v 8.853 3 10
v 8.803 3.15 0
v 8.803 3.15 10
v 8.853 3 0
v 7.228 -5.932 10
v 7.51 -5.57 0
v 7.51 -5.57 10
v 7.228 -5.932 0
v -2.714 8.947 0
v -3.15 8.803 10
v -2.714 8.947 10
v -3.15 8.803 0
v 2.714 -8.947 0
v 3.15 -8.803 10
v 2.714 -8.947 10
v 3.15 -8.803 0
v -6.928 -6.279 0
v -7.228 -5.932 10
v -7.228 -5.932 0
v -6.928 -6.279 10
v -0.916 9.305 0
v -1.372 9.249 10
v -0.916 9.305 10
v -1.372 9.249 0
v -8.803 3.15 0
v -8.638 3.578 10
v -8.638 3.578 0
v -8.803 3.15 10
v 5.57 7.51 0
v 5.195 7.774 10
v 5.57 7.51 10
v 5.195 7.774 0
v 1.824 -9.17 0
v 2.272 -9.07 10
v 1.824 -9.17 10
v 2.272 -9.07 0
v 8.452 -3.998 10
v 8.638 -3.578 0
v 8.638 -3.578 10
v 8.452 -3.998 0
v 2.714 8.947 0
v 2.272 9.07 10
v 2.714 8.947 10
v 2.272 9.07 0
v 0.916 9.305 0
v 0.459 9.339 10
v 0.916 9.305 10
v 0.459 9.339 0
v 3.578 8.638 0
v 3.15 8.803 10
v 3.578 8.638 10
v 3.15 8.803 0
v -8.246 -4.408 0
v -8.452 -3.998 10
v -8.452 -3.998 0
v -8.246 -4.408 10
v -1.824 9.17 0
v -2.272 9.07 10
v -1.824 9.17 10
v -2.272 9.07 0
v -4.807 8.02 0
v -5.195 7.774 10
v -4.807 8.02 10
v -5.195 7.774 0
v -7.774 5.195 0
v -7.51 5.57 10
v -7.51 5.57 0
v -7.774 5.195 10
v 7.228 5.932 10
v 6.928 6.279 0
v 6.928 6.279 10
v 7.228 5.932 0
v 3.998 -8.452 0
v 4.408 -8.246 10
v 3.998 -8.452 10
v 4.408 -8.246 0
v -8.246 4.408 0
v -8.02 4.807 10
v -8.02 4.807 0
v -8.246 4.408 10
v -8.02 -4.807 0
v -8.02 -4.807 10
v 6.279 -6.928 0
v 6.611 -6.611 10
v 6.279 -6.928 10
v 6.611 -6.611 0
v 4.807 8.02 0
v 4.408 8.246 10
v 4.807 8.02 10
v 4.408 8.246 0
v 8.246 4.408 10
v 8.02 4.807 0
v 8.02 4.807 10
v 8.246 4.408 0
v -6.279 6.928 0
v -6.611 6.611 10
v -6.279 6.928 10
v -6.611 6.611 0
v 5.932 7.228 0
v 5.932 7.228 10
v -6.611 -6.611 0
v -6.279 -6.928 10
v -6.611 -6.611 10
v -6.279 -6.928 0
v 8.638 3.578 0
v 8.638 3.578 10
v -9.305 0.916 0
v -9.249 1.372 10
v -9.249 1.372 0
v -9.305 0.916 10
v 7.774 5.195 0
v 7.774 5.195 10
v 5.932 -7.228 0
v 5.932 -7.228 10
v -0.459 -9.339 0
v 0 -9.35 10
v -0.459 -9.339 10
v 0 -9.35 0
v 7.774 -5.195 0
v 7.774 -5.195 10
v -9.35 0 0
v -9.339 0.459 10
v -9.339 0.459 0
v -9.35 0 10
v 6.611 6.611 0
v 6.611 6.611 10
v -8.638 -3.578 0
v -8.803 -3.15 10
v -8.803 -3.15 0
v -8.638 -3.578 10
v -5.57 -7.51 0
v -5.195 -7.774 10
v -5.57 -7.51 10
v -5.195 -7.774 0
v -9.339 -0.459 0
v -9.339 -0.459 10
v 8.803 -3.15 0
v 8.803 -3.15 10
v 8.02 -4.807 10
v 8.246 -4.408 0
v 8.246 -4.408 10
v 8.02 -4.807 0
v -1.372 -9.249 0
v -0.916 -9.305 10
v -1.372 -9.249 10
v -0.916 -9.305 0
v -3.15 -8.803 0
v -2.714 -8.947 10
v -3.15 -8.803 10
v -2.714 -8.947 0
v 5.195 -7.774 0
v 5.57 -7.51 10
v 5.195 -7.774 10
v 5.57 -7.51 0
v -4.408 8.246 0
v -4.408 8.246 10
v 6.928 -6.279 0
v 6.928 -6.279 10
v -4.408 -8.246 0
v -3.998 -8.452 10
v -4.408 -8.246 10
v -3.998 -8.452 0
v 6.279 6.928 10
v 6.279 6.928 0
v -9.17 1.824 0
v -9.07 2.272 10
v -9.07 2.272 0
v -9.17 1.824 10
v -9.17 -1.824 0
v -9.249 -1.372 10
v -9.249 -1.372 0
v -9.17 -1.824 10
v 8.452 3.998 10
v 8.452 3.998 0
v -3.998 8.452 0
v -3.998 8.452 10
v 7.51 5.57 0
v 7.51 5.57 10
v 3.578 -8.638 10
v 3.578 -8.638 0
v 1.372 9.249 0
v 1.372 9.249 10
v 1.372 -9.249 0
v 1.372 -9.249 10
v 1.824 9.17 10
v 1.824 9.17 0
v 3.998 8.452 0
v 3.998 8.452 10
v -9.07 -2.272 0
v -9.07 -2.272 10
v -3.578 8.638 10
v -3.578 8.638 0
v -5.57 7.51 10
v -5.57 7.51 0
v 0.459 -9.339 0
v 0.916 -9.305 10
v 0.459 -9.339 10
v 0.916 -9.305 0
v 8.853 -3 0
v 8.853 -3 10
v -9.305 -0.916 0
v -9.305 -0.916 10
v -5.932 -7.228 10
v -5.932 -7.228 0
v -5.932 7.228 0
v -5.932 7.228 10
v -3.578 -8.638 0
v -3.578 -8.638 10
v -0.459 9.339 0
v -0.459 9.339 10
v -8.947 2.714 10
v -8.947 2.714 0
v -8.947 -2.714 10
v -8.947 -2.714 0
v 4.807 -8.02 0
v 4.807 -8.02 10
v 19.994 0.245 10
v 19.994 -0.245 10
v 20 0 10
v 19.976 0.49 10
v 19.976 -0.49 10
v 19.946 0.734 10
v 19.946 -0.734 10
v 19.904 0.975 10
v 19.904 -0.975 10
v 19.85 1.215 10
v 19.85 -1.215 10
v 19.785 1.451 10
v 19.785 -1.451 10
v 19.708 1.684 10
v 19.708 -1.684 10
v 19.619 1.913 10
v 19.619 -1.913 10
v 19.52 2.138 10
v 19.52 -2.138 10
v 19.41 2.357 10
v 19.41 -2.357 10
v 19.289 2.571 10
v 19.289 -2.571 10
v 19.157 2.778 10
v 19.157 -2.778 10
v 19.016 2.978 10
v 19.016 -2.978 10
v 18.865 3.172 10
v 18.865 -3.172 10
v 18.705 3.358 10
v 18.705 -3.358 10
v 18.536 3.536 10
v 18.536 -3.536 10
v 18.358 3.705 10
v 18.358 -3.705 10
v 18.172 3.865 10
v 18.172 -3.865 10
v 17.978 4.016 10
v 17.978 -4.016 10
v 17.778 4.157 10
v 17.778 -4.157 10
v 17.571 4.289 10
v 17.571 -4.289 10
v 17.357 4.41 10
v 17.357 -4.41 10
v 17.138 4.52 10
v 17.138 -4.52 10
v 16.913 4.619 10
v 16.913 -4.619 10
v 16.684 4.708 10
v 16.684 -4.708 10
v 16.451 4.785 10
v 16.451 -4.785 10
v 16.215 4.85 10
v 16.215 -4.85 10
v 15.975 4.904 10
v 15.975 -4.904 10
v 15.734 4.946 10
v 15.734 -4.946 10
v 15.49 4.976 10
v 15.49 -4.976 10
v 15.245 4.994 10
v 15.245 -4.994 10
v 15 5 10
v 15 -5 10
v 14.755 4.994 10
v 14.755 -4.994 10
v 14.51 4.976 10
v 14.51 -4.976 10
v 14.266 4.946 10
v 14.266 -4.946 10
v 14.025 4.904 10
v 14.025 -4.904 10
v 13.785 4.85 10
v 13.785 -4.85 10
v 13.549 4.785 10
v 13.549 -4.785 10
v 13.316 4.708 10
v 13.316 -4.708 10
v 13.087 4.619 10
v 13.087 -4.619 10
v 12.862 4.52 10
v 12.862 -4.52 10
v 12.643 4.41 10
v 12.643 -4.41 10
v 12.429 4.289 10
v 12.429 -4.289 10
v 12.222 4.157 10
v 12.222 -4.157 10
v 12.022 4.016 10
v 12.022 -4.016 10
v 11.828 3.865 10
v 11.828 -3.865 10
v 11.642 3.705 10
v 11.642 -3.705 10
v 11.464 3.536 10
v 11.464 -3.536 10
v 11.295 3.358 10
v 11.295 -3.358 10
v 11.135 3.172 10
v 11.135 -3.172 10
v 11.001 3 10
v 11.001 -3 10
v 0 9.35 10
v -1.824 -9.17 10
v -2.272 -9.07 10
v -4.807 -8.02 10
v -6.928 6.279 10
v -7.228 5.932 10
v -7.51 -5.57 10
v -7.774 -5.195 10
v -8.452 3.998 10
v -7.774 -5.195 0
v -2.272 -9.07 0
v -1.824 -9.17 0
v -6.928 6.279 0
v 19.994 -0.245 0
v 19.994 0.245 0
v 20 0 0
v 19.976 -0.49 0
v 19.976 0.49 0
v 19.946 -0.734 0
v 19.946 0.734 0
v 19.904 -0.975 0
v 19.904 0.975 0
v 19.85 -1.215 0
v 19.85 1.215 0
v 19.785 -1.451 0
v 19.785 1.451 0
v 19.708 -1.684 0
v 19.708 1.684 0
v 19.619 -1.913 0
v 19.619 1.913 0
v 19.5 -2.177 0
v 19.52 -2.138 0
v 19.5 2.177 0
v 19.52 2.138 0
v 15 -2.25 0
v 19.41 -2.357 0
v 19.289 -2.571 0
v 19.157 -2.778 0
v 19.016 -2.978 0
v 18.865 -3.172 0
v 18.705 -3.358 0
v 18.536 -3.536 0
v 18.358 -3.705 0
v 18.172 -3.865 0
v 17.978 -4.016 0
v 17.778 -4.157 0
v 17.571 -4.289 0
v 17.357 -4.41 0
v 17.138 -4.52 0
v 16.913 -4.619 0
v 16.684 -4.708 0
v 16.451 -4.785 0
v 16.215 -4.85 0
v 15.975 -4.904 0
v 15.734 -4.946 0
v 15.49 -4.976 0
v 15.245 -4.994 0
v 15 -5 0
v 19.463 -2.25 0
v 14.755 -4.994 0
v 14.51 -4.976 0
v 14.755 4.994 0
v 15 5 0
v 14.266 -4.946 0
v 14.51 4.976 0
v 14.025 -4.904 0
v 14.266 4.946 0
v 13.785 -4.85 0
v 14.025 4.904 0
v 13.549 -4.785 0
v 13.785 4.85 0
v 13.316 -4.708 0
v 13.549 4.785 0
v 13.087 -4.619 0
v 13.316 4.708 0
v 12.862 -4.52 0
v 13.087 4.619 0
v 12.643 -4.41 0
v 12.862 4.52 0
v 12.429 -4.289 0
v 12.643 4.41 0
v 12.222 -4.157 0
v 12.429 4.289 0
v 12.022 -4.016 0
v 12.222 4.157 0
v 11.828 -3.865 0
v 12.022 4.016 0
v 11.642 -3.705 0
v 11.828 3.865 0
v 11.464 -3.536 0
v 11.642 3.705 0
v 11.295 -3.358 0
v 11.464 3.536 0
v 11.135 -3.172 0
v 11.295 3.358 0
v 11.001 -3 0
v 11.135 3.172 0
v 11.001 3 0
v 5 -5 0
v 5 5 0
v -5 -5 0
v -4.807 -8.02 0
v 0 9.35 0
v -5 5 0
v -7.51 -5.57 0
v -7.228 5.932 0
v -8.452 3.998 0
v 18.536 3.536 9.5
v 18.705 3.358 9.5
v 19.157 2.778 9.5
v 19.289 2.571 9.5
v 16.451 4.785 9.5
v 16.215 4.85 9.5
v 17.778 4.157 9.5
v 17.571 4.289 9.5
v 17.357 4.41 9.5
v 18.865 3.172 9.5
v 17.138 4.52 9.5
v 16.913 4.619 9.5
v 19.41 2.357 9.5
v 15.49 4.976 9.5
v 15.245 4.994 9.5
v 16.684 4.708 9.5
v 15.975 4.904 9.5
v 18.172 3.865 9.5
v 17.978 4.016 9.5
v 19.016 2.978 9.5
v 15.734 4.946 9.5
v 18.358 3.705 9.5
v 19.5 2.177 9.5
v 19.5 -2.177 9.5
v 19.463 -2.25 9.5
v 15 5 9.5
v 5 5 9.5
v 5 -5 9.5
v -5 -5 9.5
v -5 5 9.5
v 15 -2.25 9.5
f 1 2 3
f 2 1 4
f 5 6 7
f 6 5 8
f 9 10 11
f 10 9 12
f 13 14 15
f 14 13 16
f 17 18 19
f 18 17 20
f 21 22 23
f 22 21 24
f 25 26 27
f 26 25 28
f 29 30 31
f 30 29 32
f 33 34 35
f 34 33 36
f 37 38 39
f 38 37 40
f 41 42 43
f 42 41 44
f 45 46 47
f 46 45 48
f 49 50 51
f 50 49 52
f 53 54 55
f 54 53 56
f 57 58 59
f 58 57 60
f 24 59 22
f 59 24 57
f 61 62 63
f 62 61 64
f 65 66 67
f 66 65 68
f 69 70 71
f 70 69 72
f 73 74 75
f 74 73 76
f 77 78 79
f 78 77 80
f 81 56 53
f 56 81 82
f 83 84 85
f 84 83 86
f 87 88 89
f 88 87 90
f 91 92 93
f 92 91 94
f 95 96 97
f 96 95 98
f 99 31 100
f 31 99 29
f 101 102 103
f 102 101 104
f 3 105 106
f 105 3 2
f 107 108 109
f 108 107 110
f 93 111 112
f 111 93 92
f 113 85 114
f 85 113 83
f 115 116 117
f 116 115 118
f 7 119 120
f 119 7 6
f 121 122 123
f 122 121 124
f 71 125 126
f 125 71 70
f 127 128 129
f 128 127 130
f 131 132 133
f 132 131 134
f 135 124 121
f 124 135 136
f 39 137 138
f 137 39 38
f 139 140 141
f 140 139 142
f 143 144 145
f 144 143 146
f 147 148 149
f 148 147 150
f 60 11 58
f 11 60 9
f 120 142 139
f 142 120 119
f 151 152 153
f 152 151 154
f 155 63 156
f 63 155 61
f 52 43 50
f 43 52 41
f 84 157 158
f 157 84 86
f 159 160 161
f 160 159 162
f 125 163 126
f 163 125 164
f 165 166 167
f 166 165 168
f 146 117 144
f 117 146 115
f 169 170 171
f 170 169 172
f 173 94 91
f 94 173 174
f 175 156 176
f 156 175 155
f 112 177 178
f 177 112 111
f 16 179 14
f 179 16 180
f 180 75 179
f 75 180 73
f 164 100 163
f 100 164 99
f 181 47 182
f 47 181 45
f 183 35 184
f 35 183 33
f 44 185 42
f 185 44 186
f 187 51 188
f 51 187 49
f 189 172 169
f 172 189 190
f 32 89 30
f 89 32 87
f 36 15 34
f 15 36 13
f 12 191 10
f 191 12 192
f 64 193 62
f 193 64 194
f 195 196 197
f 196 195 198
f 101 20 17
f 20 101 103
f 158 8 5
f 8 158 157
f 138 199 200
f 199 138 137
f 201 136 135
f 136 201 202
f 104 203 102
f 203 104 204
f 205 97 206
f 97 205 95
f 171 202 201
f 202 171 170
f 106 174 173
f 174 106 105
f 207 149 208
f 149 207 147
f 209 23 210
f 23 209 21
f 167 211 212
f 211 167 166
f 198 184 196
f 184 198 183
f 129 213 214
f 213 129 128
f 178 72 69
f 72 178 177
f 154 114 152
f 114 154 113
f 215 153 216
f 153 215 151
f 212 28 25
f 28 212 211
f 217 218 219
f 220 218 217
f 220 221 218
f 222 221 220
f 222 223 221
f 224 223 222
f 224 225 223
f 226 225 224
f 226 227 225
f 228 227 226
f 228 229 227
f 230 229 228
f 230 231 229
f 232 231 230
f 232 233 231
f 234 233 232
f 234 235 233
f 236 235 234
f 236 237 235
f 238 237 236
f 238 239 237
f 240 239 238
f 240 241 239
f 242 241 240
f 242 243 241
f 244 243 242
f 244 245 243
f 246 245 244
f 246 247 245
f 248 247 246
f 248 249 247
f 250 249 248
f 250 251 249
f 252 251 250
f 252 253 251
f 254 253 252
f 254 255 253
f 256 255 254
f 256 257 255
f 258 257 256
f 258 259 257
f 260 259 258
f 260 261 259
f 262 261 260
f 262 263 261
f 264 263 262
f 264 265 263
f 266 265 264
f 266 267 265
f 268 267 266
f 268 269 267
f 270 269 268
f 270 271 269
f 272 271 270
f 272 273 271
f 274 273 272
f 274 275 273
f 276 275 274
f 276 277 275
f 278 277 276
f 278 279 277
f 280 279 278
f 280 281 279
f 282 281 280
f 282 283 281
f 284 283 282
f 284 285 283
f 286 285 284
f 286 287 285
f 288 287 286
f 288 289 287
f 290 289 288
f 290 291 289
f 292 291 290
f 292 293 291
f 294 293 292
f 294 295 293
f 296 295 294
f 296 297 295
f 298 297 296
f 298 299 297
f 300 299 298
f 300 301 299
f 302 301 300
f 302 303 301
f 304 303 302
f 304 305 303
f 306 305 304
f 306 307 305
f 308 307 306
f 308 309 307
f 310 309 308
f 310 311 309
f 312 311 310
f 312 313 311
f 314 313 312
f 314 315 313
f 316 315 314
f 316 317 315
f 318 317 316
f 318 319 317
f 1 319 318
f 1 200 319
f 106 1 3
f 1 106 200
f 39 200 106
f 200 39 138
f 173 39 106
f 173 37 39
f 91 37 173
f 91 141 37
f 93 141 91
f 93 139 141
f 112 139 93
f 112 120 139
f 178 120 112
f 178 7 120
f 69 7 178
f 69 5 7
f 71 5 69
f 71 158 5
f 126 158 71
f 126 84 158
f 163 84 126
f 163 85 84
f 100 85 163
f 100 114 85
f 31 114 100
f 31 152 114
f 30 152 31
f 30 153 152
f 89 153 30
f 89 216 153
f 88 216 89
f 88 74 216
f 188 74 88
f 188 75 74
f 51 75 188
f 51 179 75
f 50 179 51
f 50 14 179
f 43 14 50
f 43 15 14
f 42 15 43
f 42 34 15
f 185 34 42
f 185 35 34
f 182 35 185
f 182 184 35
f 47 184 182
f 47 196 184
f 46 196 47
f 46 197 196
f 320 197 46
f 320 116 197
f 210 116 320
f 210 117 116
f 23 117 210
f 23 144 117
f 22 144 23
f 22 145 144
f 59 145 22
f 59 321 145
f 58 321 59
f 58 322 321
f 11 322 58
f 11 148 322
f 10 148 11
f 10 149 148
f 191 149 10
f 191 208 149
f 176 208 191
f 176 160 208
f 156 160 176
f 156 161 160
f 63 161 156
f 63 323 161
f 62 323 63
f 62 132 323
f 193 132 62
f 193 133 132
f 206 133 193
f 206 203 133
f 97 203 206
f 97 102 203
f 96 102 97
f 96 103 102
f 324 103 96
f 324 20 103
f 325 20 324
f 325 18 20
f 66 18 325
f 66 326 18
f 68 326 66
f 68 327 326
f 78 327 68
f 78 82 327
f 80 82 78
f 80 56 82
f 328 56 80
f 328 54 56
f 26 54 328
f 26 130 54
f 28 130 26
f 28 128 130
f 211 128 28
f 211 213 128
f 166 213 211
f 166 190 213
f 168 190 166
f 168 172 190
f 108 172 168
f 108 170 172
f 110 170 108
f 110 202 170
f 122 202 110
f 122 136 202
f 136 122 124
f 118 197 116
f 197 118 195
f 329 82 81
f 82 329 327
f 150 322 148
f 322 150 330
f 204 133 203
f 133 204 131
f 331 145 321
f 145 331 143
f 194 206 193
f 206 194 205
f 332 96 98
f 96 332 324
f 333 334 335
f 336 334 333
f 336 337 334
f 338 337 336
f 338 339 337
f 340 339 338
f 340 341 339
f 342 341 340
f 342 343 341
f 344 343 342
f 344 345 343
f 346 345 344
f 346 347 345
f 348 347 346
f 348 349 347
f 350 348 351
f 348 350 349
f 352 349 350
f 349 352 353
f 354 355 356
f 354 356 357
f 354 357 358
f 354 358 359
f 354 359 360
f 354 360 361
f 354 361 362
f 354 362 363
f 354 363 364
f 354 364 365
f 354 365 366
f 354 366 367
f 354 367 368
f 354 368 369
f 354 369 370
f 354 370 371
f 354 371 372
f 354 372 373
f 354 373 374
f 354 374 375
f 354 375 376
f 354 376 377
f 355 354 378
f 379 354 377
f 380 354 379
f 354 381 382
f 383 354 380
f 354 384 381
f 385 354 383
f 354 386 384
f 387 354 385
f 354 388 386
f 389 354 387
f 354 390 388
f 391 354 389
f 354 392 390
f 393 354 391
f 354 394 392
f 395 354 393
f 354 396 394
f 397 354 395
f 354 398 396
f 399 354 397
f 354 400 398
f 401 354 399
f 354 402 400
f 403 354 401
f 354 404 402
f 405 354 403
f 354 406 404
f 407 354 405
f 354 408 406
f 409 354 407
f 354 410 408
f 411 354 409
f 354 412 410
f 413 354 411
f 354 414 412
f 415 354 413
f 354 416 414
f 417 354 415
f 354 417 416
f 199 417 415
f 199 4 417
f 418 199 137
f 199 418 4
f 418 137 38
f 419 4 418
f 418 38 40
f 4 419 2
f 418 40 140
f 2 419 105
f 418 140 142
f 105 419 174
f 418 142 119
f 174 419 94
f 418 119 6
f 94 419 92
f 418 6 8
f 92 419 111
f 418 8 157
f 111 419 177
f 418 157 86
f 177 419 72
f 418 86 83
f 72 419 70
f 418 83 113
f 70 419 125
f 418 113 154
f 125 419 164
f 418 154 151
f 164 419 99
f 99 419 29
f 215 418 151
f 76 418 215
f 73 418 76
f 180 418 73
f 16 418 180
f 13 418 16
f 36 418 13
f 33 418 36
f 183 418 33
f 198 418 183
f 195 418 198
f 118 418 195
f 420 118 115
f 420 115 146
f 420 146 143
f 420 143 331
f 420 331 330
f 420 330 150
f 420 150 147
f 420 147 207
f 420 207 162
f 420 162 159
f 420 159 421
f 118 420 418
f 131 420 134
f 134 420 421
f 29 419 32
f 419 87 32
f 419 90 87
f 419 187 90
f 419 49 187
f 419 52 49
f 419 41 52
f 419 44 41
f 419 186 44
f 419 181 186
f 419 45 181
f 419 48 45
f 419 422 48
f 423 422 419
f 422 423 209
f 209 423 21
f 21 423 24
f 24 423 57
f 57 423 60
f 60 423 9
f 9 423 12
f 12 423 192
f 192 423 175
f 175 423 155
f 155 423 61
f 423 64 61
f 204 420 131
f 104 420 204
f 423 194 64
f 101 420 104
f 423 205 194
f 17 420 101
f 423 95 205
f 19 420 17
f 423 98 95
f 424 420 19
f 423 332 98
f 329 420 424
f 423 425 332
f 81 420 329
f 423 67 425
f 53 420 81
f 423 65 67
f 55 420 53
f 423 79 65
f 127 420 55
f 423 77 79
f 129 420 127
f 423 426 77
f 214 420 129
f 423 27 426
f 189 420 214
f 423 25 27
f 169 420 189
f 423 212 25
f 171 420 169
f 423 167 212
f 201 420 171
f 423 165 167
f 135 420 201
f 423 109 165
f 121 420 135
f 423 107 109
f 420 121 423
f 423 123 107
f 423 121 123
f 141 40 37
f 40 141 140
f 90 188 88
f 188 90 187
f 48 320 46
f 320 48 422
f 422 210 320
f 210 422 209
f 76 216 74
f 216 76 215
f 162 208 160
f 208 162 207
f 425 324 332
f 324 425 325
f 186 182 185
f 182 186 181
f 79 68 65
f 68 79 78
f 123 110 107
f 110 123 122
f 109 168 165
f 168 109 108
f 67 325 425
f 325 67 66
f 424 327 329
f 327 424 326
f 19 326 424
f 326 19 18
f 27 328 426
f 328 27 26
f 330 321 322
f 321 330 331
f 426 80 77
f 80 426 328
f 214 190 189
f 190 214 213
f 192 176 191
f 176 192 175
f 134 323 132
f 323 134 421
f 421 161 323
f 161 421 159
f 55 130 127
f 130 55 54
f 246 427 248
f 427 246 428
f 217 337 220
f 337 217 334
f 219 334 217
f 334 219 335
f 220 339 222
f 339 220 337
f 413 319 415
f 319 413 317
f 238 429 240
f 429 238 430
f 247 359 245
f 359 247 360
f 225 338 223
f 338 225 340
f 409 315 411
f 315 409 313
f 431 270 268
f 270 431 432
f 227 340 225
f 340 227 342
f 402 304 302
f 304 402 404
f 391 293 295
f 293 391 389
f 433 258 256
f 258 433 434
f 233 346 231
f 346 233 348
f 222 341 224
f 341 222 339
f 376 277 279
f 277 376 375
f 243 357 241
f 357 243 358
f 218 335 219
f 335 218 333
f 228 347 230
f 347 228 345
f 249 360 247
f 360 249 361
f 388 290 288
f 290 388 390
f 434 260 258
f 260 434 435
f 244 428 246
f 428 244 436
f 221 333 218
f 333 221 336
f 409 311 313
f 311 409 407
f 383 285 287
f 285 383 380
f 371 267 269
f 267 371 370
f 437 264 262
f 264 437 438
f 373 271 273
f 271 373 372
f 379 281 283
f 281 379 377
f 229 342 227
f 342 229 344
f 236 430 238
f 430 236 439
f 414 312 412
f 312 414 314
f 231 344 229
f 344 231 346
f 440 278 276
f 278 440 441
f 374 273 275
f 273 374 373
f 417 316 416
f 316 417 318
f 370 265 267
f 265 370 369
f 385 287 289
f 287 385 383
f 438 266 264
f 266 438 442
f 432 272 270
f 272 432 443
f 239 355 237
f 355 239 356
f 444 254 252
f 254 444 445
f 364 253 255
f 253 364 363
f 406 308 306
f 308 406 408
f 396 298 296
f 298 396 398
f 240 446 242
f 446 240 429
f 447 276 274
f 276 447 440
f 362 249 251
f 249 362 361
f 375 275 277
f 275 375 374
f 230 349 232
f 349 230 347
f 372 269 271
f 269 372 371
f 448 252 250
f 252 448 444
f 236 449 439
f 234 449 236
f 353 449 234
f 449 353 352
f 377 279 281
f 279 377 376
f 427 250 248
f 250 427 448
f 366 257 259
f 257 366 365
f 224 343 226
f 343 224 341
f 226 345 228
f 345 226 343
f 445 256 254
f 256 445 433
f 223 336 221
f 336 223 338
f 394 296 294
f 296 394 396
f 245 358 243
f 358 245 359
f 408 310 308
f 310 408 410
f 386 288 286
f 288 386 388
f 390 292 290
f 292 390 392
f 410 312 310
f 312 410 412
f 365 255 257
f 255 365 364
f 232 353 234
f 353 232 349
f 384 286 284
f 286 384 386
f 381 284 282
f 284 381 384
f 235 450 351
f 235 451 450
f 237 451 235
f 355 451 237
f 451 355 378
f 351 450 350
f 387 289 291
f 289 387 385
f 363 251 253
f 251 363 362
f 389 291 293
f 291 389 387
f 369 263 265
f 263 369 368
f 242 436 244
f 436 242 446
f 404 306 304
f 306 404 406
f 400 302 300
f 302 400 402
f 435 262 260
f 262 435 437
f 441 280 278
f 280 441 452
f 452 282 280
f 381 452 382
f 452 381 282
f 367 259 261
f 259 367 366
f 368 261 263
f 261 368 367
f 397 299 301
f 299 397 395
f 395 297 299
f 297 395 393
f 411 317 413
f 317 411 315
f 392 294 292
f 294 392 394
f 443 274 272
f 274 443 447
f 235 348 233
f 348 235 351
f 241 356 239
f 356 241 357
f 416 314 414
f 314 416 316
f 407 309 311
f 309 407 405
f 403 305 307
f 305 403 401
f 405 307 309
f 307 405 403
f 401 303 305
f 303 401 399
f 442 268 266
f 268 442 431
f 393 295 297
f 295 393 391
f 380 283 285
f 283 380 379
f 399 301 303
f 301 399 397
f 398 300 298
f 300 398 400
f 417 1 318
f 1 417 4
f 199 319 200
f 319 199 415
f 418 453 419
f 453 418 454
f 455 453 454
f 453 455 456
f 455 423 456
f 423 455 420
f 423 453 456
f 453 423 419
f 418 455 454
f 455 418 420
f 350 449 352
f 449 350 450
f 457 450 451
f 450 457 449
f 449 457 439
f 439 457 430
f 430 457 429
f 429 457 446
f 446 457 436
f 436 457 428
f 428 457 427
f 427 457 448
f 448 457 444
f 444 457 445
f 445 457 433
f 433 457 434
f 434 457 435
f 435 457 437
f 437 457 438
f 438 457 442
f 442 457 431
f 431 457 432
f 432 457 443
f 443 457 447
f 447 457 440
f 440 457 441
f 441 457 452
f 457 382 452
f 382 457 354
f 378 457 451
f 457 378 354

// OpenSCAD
// Tubing clip for 12.7 mm (1/2 inch) lab stand rod
// Print orientation: flat on bed, extruded up in +Z

// ---- Rod ring ----
rod_id   = 12.7;   // inner diameter of rod ring
rod_wall  = 3;     // wall thickness
rod_od   = rod_id + 2 * rod_wall; // outer diameter = 18.7
rod_open  = 10;    // width of opening cut from -X side

// ---- Tubing ring ----
tube_id   = 6;     // inner diameter of tubing ring
tube_wall = 2;     // wall thickness
tube_od  = tube_id + 2 * tube_wall; // outer diameter = 10
tube_x   = 15;    // centre x position
tube_open = 4.5;   // width of opening cut from +X side

// ---- Bridge ----
bridge_x0 = 8;     // bridge start in X
bridge_x1 = 12;    // bridge end in X
bridge_w  = 6;     // bridge width (Y)

// ---- Misc ----
eps = 0.5;         // cutter overshoot past faces
$fn = 128;         // curve resolution

difference() {
    union() {
        // Rod ring
        cylinder(d = rod_od, h = 10);
        // Tubing ring
        translate([tube_x, 0, 0])
            cylinder(d = tube_od, h = 10);
        // Solid bridge
        translate([bridge_x0, -bridge_w / 2, 0])
            cube([bridge_x1 - bridge_x0, bridge_w, 10]);
    }
    // Rod ring opening: removes x < 0, -5 < y < 5
    translate([-rod_open / 2, -5, -eps])
        cube([rod_open, 10, 10]);
    // Tubing ring opening: removes x > 15, -2.25 < y < 2.25
    translate([tube_x, -tube_open / 2, -eps])
        cube([tube_open, tube_od + tube_open, 10]);
}
